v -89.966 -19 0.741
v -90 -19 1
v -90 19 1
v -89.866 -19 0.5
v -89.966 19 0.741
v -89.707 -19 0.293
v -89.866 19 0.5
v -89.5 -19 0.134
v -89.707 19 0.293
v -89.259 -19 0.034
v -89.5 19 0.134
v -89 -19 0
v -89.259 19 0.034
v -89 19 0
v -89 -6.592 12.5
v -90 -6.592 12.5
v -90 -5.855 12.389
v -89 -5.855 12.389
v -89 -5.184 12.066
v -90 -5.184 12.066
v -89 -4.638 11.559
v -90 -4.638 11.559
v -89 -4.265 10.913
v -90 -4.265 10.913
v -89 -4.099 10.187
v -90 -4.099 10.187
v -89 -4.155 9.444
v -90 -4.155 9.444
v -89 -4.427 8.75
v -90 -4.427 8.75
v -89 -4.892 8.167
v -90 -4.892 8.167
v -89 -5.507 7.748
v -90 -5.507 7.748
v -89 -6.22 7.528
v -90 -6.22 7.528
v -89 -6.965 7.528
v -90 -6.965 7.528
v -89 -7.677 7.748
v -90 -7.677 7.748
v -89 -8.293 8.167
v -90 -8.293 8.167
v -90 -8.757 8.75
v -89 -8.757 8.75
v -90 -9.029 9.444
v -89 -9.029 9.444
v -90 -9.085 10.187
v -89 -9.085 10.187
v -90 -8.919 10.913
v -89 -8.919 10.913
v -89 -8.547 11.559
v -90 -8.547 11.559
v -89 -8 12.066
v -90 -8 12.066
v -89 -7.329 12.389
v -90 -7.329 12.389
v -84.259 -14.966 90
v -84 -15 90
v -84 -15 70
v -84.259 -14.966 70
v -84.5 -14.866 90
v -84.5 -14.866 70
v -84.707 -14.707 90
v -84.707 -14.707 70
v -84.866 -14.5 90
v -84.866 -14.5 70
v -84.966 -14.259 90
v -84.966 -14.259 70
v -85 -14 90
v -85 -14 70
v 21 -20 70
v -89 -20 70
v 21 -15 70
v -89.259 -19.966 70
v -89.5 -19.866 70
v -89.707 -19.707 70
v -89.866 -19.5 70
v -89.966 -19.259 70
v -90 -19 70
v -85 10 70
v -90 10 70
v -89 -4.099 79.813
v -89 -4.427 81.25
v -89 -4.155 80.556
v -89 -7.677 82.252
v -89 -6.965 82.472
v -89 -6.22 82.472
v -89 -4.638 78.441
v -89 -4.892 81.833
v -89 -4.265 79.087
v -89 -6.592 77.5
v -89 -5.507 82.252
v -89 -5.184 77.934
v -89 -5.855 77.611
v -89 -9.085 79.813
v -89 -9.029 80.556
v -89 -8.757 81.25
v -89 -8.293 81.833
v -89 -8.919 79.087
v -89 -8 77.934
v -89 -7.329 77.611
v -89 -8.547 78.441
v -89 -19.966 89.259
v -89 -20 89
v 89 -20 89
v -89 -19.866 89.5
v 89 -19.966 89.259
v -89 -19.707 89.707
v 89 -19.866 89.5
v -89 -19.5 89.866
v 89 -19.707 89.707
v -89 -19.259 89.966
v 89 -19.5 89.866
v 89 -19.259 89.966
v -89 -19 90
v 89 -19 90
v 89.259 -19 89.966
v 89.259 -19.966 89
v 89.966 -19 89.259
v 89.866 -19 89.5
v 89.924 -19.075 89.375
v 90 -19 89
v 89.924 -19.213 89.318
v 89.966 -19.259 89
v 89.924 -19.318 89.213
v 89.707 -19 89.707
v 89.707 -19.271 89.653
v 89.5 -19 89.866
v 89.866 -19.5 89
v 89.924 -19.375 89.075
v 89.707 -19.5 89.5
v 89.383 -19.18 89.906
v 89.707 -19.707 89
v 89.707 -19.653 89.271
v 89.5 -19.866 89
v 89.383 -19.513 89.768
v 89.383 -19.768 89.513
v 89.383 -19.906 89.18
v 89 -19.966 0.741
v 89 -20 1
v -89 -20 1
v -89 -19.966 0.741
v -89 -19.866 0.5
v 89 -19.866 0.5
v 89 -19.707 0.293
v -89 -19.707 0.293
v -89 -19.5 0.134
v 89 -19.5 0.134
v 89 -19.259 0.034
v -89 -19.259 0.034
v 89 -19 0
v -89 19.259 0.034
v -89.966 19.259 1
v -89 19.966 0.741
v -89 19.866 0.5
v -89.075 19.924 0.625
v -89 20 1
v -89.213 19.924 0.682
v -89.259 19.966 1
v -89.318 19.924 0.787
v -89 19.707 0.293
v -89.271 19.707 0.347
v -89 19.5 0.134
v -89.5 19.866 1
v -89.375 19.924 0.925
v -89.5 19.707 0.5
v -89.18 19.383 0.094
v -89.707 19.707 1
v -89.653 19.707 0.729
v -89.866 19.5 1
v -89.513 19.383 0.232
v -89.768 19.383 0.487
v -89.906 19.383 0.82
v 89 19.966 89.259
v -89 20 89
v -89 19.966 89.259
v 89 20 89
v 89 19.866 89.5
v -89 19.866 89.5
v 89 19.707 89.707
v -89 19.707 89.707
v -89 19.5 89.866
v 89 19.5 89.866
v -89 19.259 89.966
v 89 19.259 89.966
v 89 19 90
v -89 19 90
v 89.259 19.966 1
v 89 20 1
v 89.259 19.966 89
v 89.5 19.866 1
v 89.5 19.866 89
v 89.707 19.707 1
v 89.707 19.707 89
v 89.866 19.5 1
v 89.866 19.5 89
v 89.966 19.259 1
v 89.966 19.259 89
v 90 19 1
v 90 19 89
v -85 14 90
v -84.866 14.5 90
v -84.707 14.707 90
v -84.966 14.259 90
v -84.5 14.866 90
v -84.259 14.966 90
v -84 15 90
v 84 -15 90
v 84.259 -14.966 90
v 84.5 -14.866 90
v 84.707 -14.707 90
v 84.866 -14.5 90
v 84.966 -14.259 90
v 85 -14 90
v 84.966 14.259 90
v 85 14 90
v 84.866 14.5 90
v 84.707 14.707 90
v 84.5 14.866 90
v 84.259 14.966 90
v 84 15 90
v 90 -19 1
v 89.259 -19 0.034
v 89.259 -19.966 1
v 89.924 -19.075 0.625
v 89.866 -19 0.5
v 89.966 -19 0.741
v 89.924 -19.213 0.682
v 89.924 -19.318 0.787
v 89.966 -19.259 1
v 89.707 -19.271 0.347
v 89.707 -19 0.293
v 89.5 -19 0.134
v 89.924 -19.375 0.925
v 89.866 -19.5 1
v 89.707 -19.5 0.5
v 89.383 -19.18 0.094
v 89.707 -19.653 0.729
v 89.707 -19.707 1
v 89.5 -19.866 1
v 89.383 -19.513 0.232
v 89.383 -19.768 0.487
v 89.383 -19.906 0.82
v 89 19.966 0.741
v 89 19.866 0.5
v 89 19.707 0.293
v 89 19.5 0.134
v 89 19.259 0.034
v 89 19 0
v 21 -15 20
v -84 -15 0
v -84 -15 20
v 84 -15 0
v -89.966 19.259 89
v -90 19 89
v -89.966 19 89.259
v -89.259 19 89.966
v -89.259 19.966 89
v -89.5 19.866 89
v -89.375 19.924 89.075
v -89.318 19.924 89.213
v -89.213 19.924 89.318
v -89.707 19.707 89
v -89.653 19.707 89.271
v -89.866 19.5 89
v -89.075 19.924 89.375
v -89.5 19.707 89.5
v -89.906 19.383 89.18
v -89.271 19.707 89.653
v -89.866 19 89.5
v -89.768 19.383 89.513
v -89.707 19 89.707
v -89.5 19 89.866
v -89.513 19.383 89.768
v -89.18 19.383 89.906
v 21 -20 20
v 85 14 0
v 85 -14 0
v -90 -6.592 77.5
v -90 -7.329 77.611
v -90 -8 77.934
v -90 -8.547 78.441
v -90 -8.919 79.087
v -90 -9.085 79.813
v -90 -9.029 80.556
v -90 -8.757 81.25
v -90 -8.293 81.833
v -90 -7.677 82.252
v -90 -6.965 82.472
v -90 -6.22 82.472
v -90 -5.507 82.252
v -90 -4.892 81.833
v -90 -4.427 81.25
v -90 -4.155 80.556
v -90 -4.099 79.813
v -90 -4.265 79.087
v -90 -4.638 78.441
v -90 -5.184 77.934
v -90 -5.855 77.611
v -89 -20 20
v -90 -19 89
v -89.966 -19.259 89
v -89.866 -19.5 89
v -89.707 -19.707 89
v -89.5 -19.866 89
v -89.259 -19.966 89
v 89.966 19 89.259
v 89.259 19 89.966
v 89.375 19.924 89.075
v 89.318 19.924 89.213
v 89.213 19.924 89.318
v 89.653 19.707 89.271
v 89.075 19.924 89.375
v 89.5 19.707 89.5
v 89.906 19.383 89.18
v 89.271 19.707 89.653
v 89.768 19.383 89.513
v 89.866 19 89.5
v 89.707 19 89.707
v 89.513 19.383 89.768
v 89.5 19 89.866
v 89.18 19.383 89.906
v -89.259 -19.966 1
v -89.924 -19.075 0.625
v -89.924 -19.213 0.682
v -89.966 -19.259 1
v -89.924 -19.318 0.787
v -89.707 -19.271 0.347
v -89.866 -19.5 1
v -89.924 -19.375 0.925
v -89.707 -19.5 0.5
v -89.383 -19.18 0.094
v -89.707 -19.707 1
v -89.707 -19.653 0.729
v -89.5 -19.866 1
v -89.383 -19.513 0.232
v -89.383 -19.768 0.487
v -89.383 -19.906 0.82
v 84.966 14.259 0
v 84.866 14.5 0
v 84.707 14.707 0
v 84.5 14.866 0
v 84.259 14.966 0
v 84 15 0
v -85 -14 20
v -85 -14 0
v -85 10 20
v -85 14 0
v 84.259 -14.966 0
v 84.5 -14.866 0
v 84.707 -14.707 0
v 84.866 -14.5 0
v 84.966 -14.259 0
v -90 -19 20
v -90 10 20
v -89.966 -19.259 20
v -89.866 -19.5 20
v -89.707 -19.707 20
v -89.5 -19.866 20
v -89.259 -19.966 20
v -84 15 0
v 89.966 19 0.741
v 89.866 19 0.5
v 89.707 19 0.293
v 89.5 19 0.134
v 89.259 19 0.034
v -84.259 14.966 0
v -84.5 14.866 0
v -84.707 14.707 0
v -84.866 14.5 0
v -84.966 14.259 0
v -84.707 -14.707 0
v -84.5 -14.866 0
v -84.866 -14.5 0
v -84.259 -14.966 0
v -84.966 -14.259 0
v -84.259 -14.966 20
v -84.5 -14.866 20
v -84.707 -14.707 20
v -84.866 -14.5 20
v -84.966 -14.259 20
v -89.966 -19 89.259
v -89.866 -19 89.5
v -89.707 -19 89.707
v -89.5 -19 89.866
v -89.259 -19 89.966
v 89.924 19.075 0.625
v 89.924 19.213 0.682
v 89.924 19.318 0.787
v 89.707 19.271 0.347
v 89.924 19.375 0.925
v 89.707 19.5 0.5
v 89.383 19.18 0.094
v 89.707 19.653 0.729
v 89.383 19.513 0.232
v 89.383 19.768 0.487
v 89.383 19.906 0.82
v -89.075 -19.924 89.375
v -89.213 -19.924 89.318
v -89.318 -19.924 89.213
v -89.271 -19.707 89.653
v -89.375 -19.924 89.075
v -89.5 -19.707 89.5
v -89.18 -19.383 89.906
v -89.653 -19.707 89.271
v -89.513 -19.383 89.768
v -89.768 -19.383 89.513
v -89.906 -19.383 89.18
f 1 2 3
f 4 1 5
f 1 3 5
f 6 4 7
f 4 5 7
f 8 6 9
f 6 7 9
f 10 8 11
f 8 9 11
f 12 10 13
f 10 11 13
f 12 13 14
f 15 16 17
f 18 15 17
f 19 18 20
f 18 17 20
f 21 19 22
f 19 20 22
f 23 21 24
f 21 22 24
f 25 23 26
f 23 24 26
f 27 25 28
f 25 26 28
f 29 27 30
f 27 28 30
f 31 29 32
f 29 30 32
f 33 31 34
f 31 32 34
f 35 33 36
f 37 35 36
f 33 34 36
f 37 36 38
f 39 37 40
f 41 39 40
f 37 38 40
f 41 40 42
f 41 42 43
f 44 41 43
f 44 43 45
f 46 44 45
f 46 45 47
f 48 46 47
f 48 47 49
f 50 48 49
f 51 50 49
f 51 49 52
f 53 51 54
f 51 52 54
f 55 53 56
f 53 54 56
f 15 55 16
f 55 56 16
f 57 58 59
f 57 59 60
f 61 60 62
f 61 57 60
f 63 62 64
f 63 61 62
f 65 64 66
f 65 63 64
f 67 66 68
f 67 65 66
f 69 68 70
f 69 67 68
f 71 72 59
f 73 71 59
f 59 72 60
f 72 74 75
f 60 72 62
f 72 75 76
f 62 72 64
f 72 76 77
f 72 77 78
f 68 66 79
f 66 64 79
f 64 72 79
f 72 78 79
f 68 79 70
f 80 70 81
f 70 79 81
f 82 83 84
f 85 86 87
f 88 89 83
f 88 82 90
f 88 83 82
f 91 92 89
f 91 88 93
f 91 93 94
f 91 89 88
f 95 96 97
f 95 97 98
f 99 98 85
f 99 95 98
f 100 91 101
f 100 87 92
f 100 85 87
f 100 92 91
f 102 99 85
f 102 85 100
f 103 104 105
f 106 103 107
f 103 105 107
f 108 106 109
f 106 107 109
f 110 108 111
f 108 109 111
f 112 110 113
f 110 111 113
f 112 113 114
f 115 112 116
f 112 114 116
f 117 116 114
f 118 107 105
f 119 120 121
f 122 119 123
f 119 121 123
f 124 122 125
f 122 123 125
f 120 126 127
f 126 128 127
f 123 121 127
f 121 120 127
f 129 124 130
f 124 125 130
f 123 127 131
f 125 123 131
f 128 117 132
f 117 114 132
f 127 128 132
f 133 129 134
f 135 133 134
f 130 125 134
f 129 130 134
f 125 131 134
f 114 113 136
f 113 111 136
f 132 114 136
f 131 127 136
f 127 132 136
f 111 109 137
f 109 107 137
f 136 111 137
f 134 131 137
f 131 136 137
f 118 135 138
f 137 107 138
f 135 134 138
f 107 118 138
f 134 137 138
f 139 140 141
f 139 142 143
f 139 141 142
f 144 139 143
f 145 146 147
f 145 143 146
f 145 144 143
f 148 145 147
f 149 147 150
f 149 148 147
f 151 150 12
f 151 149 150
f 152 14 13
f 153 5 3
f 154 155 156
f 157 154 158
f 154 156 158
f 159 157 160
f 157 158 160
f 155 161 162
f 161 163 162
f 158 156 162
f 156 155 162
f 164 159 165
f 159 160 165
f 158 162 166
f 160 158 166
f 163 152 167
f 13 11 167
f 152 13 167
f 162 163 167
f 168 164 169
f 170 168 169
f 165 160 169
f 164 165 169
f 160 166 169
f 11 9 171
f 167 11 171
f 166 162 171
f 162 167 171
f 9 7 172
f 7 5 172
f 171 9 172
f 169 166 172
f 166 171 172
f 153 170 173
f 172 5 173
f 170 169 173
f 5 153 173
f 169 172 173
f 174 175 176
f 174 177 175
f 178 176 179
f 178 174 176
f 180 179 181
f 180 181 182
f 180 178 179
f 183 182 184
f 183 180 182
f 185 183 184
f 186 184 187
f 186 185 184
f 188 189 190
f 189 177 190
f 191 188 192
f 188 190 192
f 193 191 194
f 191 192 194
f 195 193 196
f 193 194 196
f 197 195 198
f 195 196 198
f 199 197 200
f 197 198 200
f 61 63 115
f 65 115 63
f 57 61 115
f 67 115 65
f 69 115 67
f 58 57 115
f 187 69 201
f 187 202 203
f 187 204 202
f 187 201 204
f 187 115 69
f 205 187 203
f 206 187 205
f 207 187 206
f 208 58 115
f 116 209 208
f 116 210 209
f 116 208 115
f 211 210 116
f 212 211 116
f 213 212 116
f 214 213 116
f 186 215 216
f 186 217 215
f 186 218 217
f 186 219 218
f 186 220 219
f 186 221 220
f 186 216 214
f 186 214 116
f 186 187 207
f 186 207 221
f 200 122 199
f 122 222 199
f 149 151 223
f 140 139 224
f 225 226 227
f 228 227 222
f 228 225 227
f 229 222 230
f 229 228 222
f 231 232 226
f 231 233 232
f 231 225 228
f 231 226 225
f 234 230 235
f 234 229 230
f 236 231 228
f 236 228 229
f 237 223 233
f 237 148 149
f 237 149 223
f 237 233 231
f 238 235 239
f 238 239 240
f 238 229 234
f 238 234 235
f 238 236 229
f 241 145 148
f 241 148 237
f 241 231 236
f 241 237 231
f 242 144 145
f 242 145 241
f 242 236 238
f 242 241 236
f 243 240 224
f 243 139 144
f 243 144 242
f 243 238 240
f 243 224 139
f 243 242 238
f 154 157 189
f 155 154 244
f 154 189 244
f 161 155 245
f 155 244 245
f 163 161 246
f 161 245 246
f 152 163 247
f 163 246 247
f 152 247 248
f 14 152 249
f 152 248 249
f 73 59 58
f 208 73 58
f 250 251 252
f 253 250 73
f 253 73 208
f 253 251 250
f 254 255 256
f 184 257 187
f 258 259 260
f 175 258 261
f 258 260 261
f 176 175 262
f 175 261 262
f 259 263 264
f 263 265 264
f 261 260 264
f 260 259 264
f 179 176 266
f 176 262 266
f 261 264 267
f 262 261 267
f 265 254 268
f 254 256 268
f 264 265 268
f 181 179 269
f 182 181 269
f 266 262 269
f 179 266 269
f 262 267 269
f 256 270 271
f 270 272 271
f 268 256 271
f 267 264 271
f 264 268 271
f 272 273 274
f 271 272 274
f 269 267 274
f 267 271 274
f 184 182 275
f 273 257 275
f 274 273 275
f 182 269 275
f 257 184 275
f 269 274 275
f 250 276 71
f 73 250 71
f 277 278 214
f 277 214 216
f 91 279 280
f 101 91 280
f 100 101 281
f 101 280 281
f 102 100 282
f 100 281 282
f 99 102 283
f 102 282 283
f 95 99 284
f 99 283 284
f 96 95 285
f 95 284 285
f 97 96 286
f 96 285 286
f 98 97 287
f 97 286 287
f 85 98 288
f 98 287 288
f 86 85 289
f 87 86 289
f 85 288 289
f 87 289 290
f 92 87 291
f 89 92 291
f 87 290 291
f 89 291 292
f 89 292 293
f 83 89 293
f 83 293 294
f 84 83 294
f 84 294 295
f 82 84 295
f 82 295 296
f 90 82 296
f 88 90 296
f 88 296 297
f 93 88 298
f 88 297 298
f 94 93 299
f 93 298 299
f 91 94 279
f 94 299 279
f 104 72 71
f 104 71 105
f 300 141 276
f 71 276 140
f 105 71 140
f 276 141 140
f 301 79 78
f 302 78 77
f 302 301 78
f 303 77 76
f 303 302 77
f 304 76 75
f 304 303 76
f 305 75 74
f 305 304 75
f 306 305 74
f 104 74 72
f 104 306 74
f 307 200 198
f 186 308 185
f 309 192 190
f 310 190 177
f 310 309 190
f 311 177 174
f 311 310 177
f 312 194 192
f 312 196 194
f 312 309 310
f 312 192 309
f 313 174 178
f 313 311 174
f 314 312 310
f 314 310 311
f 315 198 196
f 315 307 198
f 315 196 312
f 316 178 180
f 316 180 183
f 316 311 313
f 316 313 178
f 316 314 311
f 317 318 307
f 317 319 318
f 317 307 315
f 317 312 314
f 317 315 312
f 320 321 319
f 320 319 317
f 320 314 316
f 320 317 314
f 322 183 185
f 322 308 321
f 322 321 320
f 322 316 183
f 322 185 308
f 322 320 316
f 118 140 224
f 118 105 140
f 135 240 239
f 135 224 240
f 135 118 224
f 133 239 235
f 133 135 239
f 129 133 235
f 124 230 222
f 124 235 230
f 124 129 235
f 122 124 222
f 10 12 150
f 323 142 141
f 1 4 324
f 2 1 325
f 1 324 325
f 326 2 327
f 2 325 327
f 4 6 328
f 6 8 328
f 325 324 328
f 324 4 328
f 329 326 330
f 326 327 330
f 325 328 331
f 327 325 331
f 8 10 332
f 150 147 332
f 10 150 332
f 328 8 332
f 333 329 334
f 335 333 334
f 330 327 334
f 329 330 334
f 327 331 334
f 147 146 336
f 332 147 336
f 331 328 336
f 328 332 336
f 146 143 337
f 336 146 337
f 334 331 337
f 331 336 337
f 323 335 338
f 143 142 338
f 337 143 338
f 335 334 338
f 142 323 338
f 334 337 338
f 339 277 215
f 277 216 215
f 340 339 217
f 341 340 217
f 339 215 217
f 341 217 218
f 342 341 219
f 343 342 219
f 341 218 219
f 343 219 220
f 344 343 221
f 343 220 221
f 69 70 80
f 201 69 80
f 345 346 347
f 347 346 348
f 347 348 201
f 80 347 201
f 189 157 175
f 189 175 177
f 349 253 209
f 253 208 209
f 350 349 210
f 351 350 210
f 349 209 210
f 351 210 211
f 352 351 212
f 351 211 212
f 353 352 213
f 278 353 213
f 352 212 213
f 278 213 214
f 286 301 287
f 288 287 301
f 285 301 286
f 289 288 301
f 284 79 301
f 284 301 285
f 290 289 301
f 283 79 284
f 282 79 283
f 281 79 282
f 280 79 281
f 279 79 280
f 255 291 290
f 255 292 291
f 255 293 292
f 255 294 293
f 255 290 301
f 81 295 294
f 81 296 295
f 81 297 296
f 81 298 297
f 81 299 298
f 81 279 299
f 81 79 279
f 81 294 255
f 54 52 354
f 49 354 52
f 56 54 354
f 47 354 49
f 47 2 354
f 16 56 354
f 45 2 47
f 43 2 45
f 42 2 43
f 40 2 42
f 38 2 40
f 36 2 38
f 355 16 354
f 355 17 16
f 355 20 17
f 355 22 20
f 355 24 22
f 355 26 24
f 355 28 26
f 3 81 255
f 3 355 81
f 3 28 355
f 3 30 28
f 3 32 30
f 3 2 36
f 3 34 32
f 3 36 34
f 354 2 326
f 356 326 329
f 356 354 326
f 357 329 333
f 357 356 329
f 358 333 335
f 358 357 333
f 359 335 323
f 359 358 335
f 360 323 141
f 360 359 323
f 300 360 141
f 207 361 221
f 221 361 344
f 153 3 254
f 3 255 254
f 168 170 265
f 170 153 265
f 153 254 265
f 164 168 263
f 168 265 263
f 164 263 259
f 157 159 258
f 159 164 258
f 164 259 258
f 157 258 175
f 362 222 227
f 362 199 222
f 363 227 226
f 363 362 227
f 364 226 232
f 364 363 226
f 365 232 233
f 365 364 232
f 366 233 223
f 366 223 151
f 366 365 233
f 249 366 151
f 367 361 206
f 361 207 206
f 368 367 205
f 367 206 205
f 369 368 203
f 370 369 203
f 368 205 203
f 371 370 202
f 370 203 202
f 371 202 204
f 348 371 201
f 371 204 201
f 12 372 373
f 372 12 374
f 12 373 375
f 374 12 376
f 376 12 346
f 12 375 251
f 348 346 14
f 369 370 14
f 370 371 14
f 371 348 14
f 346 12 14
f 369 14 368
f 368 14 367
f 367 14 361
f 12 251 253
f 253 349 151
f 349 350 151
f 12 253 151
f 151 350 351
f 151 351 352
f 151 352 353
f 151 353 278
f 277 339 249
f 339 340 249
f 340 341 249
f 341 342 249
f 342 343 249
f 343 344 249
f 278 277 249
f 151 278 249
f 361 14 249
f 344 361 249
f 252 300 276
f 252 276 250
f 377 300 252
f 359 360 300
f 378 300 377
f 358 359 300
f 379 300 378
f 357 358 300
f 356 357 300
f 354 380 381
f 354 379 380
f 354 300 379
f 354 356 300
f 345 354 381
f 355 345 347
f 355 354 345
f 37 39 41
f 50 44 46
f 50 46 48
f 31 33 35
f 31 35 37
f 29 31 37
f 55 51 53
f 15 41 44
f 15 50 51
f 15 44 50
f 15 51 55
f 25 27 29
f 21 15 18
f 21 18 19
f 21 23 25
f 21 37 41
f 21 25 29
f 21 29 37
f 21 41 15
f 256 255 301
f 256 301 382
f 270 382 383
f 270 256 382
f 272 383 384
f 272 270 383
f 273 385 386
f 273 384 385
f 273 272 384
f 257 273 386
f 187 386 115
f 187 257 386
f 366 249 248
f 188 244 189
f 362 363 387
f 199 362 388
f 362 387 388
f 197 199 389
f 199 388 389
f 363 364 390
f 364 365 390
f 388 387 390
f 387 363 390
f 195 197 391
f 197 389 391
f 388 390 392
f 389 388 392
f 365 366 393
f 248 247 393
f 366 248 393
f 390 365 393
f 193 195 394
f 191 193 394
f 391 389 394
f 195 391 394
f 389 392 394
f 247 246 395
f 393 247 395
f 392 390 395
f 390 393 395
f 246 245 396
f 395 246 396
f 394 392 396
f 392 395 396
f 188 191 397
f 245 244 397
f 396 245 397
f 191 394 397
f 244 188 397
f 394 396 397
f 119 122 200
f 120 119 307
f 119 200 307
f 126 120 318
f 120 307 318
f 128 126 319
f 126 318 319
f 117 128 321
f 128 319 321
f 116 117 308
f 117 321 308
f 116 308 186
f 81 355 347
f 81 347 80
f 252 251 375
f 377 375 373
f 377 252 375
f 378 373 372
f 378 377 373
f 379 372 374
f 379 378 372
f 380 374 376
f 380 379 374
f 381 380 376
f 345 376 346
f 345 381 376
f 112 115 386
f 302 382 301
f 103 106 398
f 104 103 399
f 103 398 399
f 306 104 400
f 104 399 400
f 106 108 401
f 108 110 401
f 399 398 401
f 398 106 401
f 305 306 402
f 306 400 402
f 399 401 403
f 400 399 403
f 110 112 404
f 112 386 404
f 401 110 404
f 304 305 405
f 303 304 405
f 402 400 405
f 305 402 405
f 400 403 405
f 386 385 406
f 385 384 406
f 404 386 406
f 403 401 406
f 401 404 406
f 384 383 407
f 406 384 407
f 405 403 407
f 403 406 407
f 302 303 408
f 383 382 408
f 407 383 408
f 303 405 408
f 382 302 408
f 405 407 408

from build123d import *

# Parameters (mm, degrees)
SKETCH1_W           = 180
SKETCH1_H           = 40
SKETCH1_W_2         = 170
SKETCH1_H_2         = 30
BOSS_EXTRUDE1_DEPTH = 90
FILLET1_R           = 1
SKETCH2_W           = 110
SKETCH2_H           = 50
CUT_EXTRUDE1_DEPTH  = 25
SKETCH3_W           = 50
SKETCH3_H           = 30
CUT_EXTRUDE2_DEPTH  = 16
SKETCH4_R           = 2.5
CUT_EXTRUDE3_DEPTH  = 1


with BuildPart() as part:
    # Sketch1 → Boss-Extrude1 (new body)
    with BuildSketch(Plane.XY):
        Rectangle(SKETCH1_W, SKETCH1_H)
        Rectangle(SKETCH1_W_2, SKETCH1_H_2, mode=Mode.SUBTRACT)
    extrude(amount=BOSS_EXTRUDE1_DEPTH)

    # Fillet1
    fillet1_edges = [part.edges().sort_by_distance(p)[0] for p in [
        (-90, 0, 90),
        (85, -15, 45),
        (85, 15, 45),
        (-85, 15, 45),
        (-85, -15, 45),
        (0, -20, 90),
        (90, 0, 90),
        (0, -20, 0),
        (-90, 0, 0),
        (0, 20, 0),
        (90, 0, 0),
        (90, -20, 45),
        (-90, -20, 45),
        (-90, 20, 45),
        (90, 20, 45),
        (0, 20, 90),
    ]]
    fillet(fillet1_edges, radius=FILLET1_R)

    # Sketch2 → Cut-Extrude1 (cut)
    with BuildSketch(Plane.XZ.offset(20)):
        with Locations((-34, 45)):
            Rectangle(SKETCH2_W, SKETCH2_H)
    extrude(amount=-CUT_EXTRUDE1_DEPTH, mode=Mode.SUBTRACT)

    # Sketch3 → Cut-Extrude2 (cut)
    with BuildSketch(Plane.ZY.offset(90)):
        with Locations((45, -5)):
            Rectangle(SKETCH3_W, SKETCH3_H)
    extrude(amount=-CUT_EXTRUDE2_DEPTH, mode=Mode.SUBTRACT)

    # Sketch4 → Cut-Extrude3 (cut)
    with BuildSketch(Plane.ZY.offset(90)):
        with Locations((10, -6.59211648)):
            Circle(SKETCH4_R)
        with Locations(Location((80, -6.59211648, 0), (0, 0, 180))):
            Circle(SKETCH4_R)
    extrude(amount=-CUT_EXTRUDE3_DEPTH, mode=Mode.SUBTRACT)


solid = part.part
